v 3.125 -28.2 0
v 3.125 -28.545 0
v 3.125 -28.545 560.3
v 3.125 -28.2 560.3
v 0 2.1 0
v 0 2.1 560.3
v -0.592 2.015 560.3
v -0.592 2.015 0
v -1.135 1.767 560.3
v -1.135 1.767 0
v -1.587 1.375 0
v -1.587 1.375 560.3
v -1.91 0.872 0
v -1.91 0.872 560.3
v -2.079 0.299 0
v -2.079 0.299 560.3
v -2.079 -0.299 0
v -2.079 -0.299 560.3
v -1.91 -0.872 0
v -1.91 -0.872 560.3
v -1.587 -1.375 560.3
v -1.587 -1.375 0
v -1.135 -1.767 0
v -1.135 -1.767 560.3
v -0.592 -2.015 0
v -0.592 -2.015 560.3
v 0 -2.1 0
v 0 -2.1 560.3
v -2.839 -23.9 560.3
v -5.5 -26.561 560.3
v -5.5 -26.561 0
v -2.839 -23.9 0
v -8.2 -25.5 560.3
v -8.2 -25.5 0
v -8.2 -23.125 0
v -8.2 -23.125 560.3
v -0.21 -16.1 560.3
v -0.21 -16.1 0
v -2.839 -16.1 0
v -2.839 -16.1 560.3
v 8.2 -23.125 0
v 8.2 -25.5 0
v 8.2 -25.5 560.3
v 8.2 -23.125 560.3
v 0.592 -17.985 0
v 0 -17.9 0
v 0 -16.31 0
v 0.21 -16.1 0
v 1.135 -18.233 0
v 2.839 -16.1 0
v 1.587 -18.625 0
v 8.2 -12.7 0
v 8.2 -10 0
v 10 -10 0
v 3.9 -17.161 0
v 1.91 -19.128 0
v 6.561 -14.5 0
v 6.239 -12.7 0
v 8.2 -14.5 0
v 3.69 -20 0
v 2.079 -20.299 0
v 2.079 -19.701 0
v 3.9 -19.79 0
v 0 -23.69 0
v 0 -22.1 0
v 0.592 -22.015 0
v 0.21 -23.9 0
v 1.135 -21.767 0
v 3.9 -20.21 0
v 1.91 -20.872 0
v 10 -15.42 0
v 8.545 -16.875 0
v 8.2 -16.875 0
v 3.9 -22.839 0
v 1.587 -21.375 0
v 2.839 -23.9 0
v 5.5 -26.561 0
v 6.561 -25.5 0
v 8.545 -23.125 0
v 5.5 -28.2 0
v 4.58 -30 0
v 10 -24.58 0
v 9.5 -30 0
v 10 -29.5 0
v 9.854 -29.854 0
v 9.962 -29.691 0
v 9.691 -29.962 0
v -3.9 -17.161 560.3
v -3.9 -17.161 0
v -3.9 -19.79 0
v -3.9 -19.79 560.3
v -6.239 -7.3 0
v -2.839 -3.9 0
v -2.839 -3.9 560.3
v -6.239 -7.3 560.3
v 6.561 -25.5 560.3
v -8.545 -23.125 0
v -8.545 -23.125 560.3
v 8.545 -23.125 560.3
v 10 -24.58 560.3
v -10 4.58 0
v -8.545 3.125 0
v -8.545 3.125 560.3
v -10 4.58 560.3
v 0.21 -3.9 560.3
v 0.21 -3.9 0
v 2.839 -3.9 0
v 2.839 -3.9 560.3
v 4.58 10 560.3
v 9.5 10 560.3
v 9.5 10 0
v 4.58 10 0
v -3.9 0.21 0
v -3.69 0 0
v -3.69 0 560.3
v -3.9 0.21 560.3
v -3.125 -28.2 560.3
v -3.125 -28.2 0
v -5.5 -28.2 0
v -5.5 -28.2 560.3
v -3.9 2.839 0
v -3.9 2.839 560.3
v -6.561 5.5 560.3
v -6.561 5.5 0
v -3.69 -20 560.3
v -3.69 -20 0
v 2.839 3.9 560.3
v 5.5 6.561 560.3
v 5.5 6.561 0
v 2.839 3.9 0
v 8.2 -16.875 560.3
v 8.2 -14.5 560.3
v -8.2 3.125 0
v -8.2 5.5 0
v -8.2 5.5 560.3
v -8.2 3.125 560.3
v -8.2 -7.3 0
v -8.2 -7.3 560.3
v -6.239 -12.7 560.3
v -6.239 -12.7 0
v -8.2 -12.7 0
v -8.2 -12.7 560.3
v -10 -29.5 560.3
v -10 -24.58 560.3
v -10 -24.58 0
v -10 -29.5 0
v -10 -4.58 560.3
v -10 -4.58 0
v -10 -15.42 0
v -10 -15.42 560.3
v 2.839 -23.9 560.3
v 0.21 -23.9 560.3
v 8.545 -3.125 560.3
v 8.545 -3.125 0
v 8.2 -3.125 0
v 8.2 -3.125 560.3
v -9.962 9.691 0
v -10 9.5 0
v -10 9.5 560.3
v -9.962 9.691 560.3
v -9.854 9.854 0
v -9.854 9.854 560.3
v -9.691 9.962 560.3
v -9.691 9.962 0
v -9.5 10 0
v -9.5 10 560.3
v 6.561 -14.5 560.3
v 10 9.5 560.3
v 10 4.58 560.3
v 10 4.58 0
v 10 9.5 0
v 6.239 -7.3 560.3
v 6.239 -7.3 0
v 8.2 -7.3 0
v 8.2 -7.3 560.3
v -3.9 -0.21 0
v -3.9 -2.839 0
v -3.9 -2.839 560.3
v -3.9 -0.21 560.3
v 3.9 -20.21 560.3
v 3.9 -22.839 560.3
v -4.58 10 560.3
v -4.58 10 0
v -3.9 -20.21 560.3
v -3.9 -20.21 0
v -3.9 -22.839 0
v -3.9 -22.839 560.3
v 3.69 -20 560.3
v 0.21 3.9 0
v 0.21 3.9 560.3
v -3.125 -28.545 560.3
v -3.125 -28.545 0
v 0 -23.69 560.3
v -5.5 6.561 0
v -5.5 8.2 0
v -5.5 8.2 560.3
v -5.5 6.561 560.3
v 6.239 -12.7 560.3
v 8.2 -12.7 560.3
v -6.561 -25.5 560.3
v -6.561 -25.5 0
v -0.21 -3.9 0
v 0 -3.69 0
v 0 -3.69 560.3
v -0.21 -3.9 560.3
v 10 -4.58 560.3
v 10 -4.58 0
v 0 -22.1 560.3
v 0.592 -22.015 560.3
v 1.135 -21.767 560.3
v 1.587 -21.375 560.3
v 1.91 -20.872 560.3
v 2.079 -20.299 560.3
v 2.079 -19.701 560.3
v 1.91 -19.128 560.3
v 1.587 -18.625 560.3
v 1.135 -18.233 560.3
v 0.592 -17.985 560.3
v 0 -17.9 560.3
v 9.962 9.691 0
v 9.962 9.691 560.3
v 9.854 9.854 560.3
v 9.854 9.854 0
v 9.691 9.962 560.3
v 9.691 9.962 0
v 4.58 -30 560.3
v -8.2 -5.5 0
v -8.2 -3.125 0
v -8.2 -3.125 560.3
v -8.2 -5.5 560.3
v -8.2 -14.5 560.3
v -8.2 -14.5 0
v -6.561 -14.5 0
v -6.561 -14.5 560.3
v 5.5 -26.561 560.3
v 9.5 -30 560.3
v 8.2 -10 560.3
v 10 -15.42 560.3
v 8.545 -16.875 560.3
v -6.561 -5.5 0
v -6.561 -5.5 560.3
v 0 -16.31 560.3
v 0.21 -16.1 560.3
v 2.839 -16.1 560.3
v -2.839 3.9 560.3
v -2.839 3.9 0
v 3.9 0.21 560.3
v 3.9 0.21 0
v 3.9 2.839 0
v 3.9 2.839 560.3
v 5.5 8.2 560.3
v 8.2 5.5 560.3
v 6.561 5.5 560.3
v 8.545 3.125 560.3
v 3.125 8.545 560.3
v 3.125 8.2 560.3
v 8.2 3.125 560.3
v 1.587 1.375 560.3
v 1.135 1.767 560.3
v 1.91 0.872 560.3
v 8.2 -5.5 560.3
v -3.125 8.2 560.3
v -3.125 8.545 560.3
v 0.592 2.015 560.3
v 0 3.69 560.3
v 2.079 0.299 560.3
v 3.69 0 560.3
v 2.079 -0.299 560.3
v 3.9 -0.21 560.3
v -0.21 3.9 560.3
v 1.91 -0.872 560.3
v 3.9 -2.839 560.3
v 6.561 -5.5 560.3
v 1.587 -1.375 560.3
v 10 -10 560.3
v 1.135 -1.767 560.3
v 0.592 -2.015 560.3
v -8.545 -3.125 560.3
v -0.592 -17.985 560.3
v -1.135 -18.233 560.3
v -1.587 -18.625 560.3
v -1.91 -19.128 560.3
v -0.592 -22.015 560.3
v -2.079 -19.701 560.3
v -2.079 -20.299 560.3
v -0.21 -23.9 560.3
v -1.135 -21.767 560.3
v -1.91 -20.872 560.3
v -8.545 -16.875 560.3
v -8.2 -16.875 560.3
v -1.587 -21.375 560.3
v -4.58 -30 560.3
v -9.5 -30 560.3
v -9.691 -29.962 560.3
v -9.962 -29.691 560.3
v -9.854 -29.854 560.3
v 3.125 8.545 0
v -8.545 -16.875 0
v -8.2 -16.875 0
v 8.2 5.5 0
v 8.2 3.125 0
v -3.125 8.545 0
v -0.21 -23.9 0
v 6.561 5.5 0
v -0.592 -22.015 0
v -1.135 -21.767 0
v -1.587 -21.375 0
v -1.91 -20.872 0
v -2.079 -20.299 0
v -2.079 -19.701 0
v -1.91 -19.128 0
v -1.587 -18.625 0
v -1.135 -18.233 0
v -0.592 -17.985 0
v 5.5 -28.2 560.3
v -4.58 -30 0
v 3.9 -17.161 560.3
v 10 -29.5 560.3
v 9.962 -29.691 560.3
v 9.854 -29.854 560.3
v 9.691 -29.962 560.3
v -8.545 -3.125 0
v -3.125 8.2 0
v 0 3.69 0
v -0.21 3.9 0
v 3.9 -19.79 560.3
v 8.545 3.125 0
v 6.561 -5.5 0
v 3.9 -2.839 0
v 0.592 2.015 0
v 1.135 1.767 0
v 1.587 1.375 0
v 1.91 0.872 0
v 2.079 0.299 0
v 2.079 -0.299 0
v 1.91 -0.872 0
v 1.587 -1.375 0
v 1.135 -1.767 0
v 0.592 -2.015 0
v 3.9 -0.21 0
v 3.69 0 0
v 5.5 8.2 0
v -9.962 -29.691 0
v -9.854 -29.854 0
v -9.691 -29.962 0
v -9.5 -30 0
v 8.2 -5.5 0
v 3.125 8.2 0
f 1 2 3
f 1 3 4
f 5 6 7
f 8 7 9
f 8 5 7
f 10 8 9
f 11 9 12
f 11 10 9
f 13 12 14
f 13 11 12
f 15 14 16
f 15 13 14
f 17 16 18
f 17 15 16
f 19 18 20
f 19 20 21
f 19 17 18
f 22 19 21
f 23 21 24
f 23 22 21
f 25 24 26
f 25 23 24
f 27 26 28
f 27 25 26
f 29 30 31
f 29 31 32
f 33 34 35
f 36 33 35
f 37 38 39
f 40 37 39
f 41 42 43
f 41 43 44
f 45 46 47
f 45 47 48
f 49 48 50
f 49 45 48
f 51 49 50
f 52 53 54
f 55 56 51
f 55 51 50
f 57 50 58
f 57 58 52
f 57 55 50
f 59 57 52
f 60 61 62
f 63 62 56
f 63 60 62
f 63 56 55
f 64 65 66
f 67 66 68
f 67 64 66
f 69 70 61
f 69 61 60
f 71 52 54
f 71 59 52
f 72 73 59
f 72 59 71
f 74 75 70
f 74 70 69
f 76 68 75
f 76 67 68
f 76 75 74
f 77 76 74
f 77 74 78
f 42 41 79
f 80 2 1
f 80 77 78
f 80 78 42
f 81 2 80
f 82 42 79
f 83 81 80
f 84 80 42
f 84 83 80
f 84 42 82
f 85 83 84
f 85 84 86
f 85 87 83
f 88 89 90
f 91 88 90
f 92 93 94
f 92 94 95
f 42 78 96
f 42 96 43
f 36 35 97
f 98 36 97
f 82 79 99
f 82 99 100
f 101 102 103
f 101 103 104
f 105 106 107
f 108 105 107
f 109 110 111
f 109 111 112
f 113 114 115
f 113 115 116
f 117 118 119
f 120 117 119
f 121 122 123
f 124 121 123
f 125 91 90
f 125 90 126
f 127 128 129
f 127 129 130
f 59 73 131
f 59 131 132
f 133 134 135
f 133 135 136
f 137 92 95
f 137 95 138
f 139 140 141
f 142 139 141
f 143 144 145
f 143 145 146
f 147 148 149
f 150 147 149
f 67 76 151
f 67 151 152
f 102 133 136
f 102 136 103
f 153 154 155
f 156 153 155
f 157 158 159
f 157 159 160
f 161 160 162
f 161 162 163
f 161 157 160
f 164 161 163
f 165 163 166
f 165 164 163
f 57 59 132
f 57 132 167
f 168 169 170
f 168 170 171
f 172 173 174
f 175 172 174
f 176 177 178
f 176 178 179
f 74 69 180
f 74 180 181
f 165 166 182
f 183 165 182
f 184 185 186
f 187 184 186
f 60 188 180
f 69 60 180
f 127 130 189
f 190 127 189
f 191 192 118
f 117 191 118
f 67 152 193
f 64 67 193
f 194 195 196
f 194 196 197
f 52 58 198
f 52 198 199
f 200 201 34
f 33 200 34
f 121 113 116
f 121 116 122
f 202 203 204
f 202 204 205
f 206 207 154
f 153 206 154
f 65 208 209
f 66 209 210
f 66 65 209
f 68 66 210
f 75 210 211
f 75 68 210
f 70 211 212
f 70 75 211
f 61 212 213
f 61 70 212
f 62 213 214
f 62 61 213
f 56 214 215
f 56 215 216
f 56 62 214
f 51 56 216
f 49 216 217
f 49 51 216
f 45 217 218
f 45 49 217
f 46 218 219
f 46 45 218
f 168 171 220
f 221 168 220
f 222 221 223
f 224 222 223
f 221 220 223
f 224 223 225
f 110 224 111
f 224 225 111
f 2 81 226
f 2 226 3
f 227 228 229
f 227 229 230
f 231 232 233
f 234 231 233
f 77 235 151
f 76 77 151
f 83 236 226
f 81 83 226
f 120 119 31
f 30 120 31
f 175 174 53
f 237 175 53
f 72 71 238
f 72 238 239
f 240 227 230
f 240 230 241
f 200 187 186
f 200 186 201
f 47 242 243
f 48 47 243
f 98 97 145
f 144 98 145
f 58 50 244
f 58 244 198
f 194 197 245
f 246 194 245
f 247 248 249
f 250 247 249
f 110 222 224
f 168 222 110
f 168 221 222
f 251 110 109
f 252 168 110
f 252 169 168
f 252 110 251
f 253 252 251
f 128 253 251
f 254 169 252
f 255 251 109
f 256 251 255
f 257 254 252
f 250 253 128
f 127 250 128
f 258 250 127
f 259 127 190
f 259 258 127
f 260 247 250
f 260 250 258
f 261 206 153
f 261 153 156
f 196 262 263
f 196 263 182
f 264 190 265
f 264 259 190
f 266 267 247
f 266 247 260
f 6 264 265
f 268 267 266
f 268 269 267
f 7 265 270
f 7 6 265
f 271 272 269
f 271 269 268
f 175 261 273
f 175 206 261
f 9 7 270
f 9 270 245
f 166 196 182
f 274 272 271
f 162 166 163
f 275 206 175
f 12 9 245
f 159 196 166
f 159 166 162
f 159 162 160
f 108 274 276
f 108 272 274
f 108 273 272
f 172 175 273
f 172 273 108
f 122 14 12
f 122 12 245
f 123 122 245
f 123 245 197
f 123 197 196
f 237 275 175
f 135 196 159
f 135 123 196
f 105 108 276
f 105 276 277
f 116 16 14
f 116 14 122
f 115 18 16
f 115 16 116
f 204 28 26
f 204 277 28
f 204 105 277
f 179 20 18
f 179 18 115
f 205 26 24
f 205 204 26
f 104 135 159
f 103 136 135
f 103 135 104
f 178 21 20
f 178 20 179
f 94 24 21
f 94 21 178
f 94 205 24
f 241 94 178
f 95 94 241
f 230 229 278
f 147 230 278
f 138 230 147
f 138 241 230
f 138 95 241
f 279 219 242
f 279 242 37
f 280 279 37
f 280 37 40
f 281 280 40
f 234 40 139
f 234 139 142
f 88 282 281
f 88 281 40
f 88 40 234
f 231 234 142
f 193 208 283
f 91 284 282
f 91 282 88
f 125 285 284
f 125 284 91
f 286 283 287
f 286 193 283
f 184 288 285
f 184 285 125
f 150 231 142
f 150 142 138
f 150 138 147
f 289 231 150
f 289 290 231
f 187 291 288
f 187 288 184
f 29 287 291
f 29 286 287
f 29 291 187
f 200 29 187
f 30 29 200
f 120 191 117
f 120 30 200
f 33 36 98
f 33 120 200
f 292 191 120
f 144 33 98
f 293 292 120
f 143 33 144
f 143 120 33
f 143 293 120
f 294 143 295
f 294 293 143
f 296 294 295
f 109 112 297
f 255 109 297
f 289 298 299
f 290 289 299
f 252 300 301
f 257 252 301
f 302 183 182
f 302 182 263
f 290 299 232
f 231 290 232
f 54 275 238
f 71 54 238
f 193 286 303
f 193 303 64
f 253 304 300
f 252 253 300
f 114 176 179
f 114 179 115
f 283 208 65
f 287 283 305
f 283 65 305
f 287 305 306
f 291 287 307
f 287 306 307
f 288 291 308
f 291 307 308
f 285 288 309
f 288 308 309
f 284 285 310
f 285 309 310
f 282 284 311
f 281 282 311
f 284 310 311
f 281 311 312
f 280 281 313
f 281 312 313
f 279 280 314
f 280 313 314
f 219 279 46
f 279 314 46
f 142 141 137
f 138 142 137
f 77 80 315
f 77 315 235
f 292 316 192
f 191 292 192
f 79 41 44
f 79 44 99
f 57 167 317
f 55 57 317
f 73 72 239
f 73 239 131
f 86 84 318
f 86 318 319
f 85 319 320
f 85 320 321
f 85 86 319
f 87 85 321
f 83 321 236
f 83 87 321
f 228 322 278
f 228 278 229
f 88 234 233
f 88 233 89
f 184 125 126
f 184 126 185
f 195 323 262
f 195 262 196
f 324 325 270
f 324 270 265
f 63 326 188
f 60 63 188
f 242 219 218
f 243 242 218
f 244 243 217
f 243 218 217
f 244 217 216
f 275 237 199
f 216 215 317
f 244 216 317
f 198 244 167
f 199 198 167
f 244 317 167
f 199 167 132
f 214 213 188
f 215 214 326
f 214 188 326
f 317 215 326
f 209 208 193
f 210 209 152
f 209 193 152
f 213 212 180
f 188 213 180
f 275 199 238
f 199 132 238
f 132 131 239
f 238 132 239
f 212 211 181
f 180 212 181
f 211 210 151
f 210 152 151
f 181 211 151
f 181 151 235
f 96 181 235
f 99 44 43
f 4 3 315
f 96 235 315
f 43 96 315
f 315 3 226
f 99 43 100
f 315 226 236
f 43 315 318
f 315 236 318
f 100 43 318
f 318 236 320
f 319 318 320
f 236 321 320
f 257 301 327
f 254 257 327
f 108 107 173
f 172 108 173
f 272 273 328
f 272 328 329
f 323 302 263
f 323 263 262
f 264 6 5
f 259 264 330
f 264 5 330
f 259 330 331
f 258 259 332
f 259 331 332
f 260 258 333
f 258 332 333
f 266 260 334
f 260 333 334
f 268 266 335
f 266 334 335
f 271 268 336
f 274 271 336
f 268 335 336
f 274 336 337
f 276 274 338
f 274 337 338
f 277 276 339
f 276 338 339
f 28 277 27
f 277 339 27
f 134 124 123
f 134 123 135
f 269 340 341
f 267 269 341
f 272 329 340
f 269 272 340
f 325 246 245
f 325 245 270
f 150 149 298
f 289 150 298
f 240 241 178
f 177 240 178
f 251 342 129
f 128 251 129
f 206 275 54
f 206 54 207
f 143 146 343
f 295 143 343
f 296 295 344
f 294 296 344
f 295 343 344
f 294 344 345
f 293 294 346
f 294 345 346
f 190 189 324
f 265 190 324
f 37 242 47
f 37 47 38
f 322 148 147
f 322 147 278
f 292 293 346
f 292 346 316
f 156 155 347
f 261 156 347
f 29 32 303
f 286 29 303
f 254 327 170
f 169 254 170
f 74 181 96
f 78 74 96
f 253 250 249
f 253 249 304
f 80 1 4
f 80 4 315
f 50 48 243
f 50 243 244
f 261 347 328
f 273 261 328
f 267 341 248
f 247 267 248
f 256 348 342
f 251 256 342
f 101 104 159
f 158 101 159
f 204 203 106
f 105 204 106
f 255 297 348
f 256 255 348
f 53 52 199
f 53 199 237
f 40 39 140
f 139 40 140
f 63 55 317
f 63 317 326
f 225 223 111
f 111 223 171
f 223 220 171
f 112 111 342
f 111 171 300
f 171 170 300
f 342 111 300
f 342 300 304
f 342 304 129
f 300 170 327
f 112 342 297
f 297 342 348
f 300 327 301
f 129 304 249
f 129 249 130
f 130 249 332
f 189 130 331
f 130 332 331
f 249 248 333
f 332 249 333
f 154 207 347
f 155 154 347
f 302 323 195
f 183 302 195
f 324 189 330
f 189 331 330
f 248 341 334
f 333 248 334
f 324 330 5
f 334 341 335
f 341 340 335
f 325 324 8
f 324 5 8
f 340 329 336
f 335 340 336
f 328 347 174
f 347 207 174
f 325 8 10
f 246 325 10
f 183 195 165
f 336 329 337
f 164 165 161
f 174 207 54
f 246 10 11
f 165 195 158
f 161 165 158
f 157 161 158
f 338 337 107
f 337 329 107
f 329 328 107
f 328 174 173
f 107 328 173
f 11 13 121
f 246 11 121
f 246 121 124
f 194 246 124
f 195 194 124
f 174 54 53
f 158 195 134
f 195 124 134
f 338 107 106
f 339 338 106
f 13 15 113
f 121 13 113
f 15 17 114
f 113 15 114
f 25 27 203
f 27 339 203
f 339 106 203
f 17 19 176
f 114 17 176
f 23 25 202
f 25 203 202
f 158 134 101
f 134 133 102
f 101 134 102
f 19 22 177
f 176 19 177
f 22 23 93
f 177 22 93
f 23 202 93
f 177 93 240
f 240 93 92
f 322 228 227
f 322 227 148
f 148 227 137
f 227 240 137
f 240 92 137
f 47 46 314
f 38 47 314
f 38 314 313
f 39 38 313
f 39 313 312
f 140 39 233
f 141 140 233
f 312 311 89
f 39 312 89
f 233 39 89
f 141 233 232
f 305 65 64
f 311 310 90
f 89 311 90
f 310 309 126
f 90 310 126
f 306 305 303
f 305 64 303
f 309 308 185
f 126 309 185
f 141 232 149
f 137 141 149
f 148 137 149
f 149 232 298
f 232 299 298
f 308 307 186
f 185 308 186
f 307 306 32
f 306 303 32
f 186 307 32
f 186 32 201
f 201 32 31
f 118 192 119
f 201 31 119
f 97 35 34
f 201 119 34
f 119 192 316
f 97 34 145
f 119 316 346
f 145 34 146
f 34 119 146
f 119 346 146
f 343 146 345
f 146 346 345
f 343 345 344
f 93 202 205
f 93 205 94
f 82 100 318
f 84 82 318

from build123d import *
from build123d.topology import SkipClean

# Parameters (mm, degrees)
BOSS_EXTRU_1_DEPTH     = 560.3
SYM_TRIE6_COPY_1_DEPTH = 560.3


with BuildPart() as part:
    # Esquisse1 → Boss.-Extru.1 (new body)
    with BuildSketch(Plane.XY):
        with BuildLine():
            Line((-9.5, 10), (-4.58, 10))
            Line((-4.58, 10), (-3.125, 8.545))
            Line((-3.125, 8.545), (-3.125, 8.2))
            Line((-3.125, 8.2), (-5.5, 8.2))
            Line((-5.5, 8.2), (-5.5, 6.560660172))
            Line((-5.5, 6.560660172), (-2.839339828, 3.9))
            Line((-2.839339828, 3.9), (-0.21, 3.9))
            Line((-0.21, 3.9), (0, 3.69))
            Line((0, 3.69), (0, 2.1))
            ThreePointArc((0, 2.1), (-2.1, 0), (0, -2.1))
            Line((0, -2.1), (0, -3.69))
            Line((0, -3.69), (-0.21, -3.9))
            Line((-0.21, -3.9), (-2.839339828, -3.9))
            Line((-2.839339828, -3.9), (-6.239339828, -7.3))
            Line((-6.239339828, -7.3), (-8.2, -7.3))
            Line((-8.2, -7.3), (-8.2, -10))
            Line((-8.2, -10), (-10, -10))
            Line((-10, -10), (-10, -4.58))
            Line((-10, -4.58), (-8.545, -3.125))
            Line((-8.545, -3.125), (-8.2, -3.125))
            Line((-8.2, -3.125), (-8.2, -5.5))
            Line((-8.2, -5.5), (-6.560660172, -5.5))
            Line((-6.560660172, -5.5), (-3.9, -2.839339828))
            Line((-3.9, -2.839339828), (-3.9, -0.21))
            Line((-3.9, -0.21), (-3.69, 0))
            Line((-3.69, 0), (-3.9, 0.21))
            Line((-3.9, 0.21), (-3.9, 2.839339828))
            Line((-3.9, 2.839339828), (-6.560660172, 5.5))
            Line((-6.560660172, 5.5), (-8.2, 5.5))
            Line((-8.2, 5.5), (-8.2, 3.125))
            Line((-8.2, 3.125), (-8.545, 3.125))
            Line((-8.545, 3.125), (-10, 4.58))
            Line((-10, 4.58), (-10, 9.5))
            ThreePointArc((-10, 9.5), (-9.853553391, 9.853553391), (-9.5, 10))
        make_face()
    boss_extru_1 = extrude(amount=BOSS_EXTRU_1_DEPTH)

    # Symétrie1: Boss.-Extru.1 across plane
    add(boss_extru_1.mirror(Plane(origin=(0, 3.69, 560.3), x_dir=(0, 0, 1), z_dir=(-1, 0, 0))))

    # Symétrie6: Boss.-Extru.1 across plane
    add(boss_extru_1.mirror(Plane(origin=(-8.2, -10, 560.3), x_dir=(0, 0, 1), z_dir=(0, 1, 0))))

    # Symétrie6 copy 1 sketch → Symétrie6 copy 1 (add)
    with SkipClean():  # the faces are left unmerged after this step: merging them gives an invalid solid
        with BuildSketch(Plane(origin=(0, -20, 0), x_dir=(-1, 0, 0), z_dir=(0, 0, 1))):
            with BuildLine():
                Line((-9.5, 10), (-4.58, 10))
                Line((-4.58, 10), (-3.125, 8.545))
                Line((-3.125, 8.545), (-3.125, 8.2))
                Line((-3.125, 8.2), (-5.5, 8.2))
                Line((-5.5, 8.2), (-5.5, 6.560660172))
                Line((-5.5, 6.560660172), (-2.839339828, 3.9))
                Line((-2.839339828, 3.9), (-0.21, 3.9))
                Line((-0.21, 3.9), (0, 3.69))
                Line((0, 3.69), (0, 2.1))
                ThreePointArc((0, 2.1), (-2.1, 0), (0, -2.1))
                Line((0, -2.1), (0, -3.69))
                Line((0, -3.69), (-0.21, -3.9))
                Line((-0.21, -3.9), (-2.839339828, -3.9))
                Line((-2.839339828, -3.9), (-6.239339828, -7.3))
                Line((-6.239339828, -7.3), (-8.2, -7.3))
                Line((-8.2, -7.3), (-8.2, -10))
                Line((-8.2, -10), (-10, -10))
                Line((-10, -10), (-10, -4.58))
                Line((-10, -4.58), (-8.545, -3.125))
                Line((-8.545, -3.125), (-8.2, -3.125))
                Line((-8.2, -3.125), (-8.2, -5.5))
                Line((-8.2, -5.5), (-6.560660172, -5.5))
                Line((-6.560660172, -5.5), (-3.9, -2.839339828))
                Line((-3.9, -2.839339828), (-3.9, -0.21))
                Line((-3.9, -0.21), (-3.69, 0))
                Line((-3.69, 0), (-3.9, 0.21))
                Line((-3.9, 0.21), (-3.9, 2.839339828))
                Line((-3.9, 2.839339828), (-6.560660172, 5.5))
                Line((-6.560660172, 5.5), (-8.2, 5.5))
                Line((-8.2, 5.5), (-8.2, 3.125))
                Line((-8.2, 3.125), (-8.545, 3.125))
                Line((-8.545, 3.125), (-10, 4.58))
                Line((-10, 4.58), (-10, 9.5))
                ThreePointArc((-10, 9.5), (-9.853553391, 9.853553391), (-9.5, 10))
            make_face()
        extrude(amount=SYM_TRIE6_COPY_1_DEPTH)


solid = part.part
